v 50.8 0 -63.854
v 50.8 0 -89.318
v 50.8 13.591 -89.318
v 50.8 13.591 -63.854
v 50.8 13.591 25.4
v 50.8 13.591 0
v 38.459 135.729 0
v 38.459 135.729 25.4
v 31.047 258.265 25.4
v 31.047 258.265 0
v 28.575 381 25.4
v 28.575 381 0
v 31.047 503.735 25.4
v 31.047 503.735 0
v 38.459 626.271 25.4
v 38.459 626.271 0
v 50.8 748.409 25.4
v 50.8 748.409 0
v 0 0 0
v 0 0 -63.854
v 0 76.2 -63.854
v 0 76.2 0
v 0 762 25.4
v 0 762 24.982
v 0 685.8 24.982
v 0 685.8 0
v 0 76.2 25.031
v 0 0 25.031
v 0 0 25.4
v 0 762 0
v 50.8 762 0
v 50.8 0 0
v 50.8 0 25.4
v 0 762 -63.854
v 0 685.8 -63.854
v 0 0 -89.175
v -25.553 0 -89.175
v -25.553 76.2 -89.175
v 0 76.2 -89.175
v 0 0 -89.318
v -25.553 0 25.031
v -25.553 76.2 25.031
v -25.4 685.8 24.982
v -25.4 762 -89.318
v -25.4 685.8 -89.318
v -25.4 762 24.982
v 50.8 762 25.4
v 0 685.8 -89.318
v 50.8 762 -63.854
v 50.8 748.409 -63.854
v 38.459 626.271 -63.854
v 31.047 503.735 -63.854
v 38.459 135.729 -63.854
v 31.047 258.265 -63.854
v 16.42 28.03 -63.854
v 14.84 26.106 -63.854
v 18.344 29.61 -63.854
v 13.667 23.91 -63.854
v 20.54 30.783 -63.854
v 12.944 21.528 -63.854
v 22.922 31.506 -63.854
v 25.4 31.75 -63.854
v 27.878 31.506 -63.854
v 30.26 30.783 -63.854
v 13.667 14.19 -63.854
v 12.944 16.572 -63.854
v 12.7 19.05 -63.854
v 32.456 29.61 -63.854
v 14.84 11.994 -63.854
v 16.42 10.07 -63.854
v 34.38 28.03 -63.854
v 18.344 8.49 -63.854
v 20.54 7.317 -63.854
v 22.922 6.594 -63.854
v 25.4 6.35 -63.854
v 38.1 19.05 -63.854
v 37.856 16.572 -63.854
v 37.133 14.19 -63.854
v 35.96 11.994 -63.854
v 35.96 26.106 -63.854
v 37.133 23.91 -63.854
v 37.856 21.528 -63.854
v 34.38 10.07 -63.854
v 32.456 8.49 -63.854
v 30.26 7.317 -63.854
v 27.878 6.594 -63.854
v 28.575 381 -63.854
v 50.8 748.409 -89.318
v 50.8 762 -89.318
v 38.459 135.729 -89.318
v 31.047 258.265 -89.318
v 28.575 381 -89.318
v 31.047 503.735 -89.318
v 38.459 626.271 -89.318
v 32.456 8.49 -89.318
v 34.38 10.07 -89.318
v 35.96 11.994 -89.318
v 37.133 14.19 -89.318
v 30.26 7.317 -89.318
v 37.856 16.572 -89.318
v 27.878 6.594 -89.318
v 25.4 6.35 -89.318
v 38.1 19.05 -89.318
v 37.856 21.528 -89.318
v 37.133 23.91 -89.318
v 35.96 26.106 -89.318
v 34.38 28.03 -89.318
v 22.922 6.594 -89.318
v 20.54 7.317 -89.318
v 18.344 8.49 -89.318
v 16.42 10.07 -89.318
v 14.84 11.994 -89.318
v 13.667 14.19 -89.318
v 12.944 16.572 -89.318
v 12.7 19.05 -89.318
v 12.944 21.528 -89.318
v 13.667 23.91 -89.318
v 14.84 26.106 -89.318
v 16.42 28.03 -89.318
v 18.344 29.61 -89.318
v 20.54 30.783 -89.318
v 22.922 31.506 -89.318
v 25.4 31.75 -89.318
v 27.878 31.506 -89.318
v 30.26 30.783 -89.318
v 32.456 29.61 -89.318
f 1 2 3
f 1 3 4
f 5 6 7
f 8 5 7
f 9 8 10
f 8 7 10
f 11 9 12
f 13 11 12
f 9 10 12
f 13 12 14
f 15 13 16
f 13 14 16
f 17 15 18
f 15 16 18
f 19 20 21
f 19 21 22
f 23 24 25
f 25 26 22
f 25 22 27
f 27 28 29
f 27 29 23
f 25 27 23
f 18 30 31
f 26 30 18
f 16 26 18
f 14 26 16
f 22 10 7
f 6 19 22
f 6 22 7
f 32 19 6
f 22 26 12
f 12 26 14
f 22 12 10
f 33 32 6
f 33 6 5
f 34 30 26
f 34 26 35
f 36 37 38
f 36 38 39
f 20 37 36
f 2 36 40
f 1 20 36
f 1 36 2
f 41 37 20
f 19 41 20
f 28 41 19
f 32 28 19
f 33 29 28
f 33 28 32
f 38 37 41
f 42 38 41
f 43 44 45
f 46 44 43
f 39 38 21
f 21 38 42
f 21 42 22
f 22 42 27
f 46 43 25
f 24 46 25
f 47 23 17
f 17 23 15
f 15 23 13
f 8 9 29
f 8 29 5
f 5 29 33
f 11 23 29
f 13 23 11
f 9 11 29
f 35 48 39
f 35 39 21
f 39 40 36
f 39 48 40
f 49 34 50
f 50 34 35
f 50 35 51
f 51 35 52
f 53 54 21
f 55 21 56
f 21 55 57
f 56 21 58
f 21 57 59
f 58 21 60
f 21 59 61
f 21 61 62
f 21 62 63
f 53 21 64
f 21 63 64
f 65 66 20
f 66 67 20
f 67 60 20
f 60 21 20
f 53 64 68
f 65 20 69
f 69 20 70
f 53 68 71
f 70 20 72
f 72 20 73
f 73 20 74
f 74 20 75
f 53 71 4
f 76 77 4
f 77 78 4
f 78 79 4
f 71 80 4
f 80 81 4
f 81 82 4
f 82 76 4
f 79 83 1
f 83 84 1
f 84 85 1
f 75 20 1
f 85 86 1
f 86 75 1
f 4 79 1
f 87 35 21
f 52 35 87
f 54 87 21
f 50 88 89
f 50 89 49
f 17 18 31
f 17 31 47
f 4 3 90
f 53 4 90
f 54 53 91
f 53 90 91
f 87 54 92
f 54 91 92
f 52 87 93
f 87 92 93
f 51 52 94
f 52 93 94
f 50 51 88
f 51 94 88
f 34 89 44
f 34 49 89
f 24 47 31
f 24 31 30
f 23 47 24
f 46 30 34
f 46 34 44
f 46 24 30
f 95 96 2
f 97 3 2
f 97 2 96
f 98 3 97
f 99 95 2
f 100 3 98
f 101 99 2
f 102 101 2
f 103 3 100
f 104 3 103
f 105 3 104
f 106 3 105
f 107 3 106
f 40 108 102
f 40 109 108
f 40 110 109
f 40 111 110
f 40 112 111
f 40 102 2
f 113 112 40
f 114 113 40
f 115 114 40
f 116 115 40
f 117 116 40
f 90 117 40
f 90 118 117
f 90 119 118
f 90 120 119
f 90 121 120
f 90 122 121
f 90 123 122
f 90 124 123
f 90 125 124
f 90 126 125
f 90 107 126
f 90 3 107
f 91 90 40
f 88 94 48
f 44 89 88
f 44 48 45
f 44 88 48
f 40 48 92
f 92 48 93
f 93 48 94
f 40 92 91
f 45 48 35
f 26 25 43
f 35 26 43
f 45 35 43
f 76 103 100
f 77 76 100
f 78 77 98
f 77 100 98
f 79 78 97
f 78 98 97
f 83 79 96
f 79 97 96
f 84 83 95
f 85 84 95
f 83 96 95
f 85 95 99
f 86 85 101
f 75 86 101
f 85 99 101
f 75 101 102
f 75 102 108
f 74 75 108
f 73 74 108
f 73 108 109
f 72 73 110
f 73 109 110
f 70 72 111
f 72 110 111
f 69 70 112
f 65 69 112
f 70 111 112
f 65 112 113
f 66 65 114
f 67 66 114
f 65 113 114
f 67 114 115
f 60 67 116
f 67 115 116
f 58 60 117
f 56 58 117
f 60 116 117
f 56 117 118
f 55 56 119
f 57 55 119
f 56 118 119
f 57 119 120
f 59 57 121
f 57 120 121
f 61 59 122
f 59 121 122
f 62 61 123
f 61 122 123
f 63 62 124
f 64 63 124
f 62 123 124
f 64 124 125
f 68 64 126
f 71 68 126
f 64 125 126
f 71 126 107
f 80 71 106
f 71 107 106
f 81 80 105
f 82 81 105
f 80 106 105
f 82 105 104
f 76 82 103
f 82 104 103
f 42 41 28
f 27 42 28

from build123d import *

# Parameters (mm, degrees)
F0_W      = 50.8
F0_H      = 25.4
F1_DEPTH  = 762
F2_W      = 25.5529284477
F2_H      = 114.2060160637
F3_DEPTH  = 76.2
F4_W      = 50.8
F4_H      = 25.4632905126
F5_DEPTH  = 762
F7_DEPTH  = 76.2
F9_DEPTH  = 114.7185005913
F10_R     = 12.7
F11_DEPTH = 25.4632905126


with BuildPart() as f1:
    # F0 (on Front) → F1 (new body)
    with BuildSketch(Plane.XZ):
        with Locations((25.4, 12.7)):
            Rectangle(F0_W, F0_H)
    extrude(amount=-F1_DEPTH)

    # F2 (on Front) → F3 (join)
    with BuildSketch(Plane.XZ):
        with Locations((-12.7764642239, -32.0715308189)):
            Rectangle(F2_W, F2_H)
    extrude(amount=-F3_DEPTH)

    # F4 (on Front) → F5 (join)
    with BuildSketch(Plane.XZ):
        with Locations((25.4, -76.585855335)):
            Rectangle(F4_W, F4_H)
    extrude(amount=-F5_DEPTH)

    # F6 (on face) → F7 (join)
    with BuildSketch(Plane(origin=(0, 762, 0), x_dir=(-1, 0, 0), z_dir=(0, 1, 0))):
        Polygon((0, -63.8542100787), (0, -89.3175005913), (25.4, -89.3175005913), (25.4, 24.9824994087), (0, 24.9824994087), align=None)
    extrude(amount=-F7_DEPTH)

    # F8 (on face) → F9 (cut, through all)
    with BuildSketch(Plane(origin=(0, 0, -89.3175005913), x_dir=(1, 0, 0), z_dir=(0, 0, -1))):
        with BuildLine():
            Line((50.8, -748.409375731), (50.8, -13.590624269))
            ThreePointArc((50.8, -13.590624269), (28.575, -381), (50.8, -748.409375731))
        make_face()
        with BuildLine():
            ThreePointArc((50.8, -748.409375731), (3260.6154846766, -3423.4386764568), (6124.575, -381))
            ThreePointArc((6124.575, -381), (3260.6154846766, 2661.4386764568), (50.8, -13.590624269))
            Line((50.8, -13.590624269), (50.8, -748.409375731))
        make_face()
    extrude(amount=-F9_DEPTH, mode=Mode.SUBTRACT)

    # F10 (on face) → F11 (cut, through all)
    with BuildSketch(Plane(origin=(0, 0, -89.3175005913), x_dir=(1, 0, 0), z_dir=(0, 0, -1))):
        with Locations((25.4, -19.05)):
            Circle(F10_R)
    extrude(amount=-F11_DEPTH, mode=Mode.SUBTRACT)


solid = f1.part
